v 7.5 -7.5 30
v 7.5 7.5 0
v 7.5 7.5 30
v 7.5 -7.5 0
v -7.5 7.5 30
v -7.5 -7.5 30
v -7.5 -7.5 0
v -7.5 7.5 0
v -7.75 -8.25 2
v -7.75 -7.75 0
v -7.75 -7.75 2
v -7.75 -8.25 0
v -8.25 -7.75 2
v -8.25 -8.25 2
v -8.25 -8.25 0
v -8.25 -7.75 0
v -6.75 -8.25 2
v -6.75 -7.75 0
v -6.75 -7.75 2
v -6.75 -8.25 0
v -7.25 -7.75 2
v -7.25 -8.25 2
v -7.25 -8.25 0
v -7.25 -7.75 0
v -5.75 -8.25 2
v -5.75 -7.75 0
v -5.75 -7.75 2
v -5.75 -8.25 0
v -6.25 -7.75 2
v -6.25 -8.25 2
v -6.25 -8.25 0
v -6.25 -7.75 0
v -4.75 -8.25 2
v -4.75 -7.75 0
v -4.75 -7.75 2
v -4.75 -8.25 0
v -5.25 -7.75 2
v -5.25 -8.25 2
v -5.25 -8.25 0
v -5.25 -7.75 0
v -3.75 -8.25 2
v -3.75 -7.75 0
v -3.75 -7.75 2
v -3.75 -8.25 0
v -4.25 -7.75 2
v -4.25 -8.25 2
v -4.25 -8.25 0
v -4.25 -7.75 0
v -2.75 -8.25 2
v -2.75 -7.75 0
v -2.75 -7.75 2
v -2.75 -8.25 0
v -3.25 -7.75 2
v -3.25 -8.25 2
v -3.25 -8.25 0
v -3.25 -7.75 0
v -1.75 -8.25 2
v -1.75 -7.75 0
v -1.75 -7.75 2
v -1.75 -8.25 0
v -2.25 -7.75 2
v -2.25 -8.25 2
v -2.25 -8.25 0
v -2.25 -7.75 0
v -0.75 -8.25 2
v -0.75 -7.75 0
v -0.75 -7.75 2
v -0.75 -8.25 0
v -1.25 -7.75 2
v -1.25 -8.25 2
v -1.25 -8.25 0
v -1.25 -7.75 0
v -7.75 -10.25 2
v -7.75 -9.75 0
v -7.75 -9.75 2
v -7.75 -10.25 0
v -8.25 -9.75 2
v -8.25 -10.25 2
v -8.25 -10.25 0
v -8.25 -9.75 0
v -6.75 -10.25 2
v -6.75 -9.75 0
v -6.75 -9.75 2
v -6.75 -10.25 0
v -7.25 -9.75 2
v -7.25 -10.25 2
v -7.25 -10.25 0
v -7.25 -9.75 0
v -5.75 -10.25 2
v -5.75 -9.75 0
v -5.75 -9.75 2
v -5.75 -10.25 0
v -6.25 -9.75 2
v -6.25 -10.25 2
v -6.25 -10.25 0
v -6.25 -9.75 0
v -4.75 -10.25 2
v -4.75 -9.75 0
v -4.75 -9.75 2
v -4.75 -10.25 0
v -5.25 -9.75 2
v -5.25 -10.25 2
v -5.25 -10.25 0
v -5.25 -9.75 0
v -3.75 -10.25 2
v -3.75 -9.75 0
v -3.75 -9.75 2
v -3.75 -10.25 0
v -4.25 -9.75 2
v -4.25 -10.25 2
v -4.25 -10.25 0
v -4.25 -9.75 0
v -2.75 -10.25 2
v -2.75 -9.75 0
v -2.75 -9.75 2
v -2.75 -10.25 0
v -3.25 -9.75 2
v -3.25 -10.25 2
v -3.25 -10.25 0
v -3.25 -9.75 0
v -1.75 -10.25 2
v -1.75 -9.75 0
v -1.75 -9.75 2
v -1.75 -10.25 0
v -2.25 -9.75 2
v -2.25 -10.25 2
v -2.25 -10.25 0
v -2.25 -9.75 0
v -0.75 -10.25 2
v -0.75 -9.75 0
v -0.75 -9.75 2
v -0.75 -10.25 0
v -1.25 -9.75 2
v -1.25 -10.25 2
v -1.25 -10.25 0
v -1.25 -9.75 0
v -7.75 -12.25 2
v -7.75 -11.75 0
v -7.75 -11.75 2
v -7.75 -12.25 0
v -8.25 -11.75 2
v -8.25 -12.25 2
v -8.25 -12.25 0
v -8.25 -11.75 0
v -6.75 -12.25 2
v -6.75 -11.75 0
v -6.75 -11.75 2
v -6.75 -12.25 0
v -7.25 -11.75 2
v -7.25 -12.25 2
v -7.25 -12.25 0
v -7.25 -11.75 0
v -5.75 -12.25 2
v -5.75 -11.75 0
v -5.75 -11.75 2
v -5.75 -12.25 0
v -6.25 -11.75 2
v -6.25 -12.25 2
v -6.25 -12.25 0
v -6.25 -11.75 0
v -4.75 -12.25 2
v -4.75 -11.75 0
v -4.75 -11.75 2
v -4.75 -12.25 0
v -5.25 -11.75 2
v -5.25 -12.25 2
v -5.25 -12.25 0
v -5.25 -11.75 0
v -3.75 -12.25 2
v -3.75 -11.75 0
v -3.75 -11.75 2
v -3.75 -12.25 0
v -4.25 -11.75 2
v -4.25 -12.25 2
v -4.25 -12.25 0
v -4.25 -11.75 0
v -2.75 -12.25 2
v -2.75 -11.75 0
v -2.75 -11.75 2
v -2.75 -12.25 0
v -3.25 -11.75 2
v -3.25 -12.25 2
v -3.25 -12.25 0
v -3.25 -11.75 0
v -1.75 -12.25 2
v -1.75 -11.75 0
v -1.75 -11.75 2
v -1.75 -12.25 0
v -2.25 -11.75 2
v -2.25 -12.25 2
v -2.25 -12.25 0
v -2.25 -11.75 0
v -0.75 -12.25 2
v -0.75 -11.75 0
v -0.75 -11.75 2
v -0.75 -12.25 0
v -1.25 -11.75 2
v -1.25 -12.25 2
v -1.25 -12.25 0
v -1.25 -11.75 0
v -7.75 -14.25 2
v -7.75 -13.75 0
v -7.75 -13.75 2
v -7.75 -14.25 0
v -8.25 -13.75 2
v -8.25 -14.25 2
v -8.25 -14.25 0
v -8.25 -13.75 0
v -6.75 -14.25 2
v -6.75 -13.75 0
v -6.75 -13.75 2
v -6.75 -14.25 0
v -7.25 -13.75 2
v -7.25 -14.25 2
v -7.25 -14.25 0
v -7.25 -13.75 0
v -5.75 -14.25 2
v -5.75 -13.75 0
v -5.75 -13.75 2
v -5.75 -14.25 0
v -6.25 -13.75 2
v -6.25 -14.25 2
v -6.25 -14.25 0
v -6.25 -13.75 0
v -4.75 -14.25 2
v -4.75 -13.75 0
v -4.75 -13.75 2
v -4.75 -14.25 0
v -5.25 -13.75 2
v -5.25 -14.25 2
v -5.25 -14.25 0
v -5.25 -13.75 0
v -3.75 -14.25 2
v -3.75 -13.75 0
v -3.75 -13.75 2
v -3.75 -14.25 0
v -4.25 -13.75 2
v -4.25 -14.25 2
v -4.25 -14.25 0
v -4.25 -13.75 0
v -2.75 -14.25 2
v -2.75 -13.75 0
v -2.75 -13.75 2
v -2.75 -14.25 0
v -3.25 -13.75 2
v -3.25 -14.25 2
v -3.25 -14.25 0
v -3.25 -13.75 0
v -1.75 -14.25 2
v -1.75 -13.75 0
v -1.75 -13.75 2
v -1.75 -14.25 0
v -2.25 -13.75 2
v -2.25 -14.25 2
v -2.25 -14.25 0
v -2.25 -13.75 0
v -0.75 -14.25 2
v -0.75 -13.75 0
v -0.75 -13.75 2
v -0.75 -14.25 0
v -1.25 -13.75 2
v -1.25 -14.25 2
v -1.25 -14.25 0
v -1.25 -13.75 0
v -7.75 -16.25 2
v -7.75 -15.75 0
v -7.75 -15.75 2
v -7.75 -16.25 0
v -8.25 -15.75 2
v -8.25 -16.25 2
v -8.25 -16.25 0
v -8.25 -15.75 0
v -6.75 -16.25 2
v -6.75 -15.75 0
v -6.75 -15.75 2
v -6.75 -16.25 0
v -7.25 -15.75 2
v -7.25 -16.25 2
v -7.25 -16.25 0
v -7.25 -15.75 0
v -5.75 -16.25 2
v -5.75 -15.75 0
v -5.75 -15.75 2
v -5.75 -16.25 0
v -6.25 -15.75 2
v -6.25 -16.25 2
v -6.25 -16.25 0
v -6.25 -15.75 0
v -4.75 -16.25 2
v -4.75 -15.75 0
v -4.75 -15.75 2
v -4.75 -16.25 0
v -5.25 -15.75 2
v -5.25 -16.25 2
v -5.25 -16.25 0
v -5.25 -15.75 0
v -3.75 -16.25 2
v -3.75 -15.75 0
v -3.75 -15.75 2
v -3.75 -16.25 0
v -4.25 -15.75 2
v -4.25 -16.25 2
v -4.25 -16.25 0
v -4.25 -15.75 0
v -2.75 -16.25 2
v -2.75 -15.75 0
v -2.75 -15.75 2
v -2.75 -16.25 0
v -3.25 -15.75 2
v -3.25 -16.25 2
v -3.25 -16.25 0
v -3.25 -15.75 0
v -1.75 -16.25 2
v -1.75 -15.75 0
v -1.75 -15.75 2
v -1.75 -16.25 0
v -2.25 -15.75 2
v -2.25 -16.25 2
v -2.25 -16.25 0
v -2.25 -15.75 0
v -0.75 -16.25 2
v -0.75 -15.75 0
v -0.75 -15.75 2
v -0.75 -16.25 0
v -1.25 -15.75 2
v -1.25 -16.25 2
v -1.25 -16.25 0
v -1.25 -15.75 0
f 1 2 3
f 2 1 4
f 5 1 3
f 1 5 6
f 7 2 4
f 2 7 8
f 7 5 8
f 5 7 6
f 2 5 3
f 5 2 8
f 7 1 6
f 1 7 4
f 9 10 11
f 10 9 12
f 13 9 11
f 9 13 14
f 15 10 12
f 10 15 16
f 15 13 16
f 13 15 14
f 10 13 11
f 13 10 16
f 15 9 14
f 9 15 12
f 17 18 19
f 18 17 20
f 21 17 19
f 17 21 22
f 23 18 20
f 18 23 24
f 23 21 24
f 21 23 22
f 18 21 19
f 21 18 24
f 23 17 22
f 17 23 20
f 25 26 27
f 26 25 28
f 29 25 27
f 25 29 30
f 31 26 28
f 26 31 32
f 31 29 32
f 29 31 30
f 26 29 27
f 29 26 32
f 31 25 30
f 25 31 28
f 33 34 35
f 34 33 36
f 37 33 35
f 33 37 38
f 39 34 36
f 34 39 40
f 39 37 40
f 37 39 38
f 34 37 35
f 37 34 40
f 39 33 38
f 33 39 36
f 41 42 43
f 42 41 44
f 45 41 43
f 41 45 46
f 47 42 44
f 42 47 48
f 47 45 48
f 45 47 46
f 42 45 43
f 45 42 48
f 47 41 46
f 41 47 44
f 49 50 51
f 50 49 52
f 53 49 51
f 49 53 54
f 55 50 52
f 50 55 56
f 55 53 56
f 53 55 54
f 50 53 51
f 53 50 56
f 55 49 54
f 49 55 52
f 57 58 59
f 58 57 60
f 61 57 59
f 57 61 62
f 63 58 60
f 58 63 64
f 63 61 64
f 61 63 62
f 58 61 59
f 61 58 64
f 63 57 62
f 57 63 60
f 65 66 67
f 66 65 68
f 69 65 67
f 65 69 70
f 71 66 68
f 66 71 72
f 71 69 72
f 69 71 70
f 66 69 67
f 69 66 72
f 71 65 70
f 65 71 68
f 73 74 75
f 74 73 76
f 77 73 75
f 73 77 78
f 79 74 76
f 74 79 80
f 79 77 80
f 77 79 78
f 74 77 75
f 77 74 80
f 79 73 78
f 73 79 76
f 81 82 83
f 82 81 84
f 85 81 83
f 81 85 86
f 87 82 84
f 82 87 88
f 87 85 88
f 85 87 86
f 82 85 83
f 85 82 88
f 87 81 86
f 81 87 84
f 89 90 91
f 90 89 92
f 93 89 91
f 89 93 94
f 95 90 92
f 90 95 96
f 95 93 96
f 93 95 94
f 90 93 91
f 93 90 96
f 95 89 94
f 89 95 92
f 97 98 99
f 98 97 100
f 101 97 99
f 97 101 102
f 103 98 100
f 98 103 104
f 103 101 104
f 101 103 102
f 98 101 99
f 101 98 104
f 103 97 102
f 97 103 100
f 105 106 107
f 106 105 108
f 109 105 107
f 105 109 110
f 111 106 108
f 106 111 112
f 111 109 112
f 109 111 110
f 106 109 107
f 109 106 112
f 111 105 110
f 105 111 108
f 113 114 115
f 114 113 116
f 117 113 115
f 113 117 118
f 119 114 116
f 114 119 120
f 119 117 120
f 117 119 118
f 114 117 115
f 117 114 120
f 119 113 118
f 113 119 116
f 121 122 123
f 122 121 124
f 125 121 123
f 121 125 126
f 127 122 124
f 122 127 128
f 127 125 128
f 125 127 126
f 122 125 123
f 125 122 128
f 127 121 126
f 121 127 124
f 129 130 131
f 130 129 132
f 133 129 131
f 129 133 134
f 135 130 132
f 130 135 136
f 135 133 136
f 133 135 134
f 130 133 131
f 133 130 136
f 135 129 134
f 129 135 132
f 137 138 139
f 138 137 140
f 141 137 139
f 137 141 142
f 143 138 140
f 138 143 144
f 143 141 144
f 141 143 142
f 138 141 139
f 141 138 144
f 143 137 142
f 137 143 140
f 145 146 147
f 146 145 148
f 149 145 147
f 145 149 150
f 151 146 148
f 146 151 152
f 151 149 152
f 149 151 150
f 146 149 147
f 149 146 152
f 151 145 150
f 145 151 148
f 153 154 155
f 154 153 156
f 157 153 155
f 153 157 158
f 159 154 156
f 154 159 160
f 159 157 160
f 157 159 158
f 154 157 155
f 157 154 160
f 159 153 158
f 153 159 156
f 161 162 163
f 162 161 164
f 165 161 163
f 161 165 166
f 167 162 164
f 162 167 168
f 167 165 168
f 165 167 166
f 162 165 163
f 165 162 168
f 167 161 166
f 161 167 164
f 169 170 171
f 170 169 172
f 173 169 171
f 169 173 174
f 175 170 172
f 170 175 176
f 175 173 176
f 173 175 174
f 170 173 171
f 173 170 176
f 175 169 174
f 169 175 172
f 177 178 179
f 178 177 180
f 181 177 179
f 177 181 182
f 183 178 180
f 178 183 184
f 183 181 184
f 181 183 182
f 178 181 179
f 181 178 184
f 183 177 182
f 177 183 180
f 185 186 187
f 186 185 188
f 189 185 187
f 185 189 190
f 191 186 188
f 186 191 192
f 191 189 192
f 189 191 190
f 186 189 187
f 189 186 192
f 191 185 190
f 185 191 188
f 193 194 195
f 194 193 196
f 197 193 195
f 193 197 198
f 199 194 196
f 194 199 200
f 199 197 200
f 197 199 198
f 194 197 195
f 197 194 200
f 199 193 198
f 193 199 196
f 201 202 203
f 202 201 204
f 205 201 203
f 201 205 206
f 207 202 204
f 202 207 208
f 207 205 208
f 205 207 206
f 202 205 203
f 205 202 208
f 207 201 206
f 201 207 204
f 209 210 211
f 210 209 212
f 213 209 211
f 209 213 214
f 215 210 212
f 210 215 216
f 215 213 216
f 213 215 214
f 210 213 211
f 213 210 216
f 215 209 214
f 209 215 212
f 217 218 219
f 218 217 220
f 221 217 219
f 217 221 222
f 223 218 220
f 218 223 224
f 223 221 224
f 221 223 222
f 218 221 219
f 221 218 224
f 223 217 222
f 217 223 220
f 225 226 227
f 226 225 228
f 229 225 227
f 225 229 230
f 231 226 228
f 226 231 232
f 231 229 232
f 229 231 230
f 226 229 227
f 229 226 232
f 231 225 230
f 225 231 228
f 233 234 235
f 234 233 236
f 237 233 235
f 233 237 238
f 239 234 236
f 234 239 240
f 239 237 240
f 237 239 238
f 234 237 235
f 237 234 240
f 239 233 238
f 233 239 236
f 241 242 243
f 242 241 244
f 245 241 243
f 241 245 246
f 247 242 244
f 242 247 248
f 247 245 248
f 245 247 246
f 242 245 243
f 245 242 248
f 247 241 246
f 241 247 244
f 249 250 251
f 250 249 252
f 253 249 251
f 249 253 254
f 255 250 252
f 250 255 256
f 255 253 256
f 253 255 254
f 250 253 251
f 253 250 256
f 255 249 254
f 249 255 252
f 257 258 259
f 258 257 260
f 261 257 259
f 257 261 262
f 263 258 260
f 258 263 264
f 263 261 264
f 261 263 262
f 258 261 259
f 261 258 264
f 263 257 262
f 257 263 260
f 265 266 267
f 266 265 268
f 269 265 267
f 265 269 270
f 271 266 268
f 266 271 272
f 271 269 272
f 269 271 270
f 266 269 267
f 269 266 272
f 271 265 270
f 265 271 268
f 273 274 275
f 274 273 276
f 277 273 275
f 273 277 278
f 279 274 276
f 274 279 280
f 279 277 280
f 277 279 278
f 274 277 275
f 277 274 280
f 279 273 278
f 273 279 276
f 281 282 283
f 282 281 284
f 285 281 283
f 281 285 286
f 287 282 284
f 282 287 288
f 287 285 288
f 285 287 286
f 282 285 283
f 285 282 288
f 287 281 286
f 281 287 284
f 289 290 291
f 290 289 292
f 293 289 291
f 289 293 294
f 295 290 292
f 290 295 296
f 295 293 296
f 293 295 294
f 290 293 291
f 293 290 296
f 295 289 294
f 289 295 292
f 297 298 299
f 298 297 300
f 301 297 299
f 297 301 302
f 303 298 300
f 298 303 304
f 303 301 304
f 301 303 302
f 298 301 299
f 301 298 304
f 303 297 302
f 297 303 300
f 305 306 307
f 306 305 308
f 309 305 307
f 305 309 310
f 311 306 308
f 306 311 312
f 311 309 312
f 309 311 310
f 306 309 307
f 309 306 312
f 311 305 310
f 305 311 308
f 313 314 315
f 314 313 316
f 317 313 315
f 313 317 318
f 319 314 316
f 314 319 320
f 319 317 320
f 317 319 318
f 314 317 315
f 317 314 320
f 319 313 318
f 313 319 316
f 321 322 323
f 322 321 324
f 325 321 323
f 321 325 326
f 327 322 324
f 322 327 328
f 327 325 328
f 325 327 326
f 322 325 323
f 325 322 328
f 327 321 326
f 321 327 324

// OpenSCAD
translate([0, 0, 15]) color([0,1,0,0.9]) cube([15, 15, 30], center=true);
translate([-8, -8, 1]) color([1,0,0]) cube([0.5, 0.5, 2], center=true);
translate([-7, -8, 1]) color([1,0,0]) cube([0.5, 0.5, 2], center=true);
translate([-6, -8, 1]) color([1,0,0]) cube([0.5, 0.5, 2], center=true);
translate([-5, -8, 1]) color([1,0,0]) cube([0.5, 0.5, 2], center=true);
translate([-4, -8, 1]) color([1,0,0]) cube([0.5, 0.5, 2], center=true);
translate([-3, -8, 1]) color([1,0,0]) cube([0.5, 0.5, 2], center=true);
translate([-2, -8, 1]) color([1,0,0]) cube([0.5, 0.5, 2], center=true);
translate([-1, -8, 1]) color([1,0,0]) cube([0.5, 0.5, 2], center=true);
translate([-8, -10, 1]) color([1,0,0]) cube([0.5, 0.5, 2], center=true);
translate([-7, -10, 1]) color([1,0,0]) cube([0.5, 0.5, 2], center=true);
translate([-6, -10, 1]) color([1,0,0]) cube([0.5, 0.5, 2], center=true);
translate([-5, -10, 1]) color([1,0,0]) cube([0.5, 0.5, 2], center=true);
translate([-4, -10, 1]) color([1,0,0]) cube([0.5, 0.5, 2], center=true);
translate([-3, -10, 1]) color([1,0,0]) cube([0.5, 0.5, 2], center=true);
translate([-2, -10, 1]) color([1,0,0]) cube([0.5, 0.5, 2], center=true);
translate([-1, -10, 1]) color([1,0,0]) cube([0.5, 0.5, 2], center=true);
translate([-8, -12, 1]) color([1,0,0]) cube([0.5, 0.5, 2], center=true);
translate([-7, -12, 1]) color([1,0,0]) cube([0.5, 0.5, 2], center=true);
translate([-6, -12, 1]) color([1,0,0]) cube([0.5, 0.5, 2], center=true);
translate([-5, -12, 1]) color([1,0,0]) cube([0.5, 0.5, 2], center=true);
translate([-4, -12, 1]) color([1,0,0]) cube([0.5, 0.5, 2], center=true);
translate([-3, -12, 1]) color([1,0,0]) cube([0.5, 0.5, 2], center=true);
translate([-2, -12, 1]) color([1,0,0]) cube([0.5, 0.5, 2], center=true);
translate([-1, -12, 1]) color([1,0,0]) cube([0.5, 0.5, 2], center=true);
translate([-8, -14, 1]) color([1,0,0]) cube([0.5, 0.5, 2], center=true);
translate([-7, -14, 1]) color([1,0,0]) cube([0.5, 0.5, 2], center=true);
translate([-6, -14, 1]) color([1,0,0]) cube([0.5, 0.5, 2], center=true);
translate([-5, -14, 1]) color([1,0,0]) cube([0.5, 0.5, 2], center=true);
translate([-4, -14, 1]) color([1,0,0]) cube([0.5, 0.5, 2], center=true);
translate([-3, -14, 1]) color([1,0,0]) cube([0.5, 0.5, 2], center=true);
translate([-2, -14, 1]) color([1,0,0]) cube([0.5, 0.5, 2], center=true);
translate([-1, -14, 1]) color([1,0,0]) cube([0.5, 0.5, 2], center=true);
translate([-8, -16, 1]) color([1,0,0]) cube([0.5, 0.5, 2], center=true);
translate([-7, -16, 1]) color([1,0,0]) cube([0.5, 0.5, 2], center=true);
translate([-6, -16, 1]) color([1,0,0]) cube([0.5, 0.5, 2], center=true);
translate([-5, -16, 1]) color([1,0,0]) cube([0.5, 0.5, 2], center=true);
translate([-4, -16, 1]) color([1,0,0]) cube([0.5, 0.5, 2], center=true);
translate([-3, -16, 1]) color([1,0,0]) cube([0.5, 0.5, 2], center=true);
translate([-2, -16, 1]) color([1,0,0]) cube([0.5, 0.5, 2], center=true);
translate([-1, -16, 1]) color([1,0,0]) cube([0.5, 0.5, 2], center=true);
